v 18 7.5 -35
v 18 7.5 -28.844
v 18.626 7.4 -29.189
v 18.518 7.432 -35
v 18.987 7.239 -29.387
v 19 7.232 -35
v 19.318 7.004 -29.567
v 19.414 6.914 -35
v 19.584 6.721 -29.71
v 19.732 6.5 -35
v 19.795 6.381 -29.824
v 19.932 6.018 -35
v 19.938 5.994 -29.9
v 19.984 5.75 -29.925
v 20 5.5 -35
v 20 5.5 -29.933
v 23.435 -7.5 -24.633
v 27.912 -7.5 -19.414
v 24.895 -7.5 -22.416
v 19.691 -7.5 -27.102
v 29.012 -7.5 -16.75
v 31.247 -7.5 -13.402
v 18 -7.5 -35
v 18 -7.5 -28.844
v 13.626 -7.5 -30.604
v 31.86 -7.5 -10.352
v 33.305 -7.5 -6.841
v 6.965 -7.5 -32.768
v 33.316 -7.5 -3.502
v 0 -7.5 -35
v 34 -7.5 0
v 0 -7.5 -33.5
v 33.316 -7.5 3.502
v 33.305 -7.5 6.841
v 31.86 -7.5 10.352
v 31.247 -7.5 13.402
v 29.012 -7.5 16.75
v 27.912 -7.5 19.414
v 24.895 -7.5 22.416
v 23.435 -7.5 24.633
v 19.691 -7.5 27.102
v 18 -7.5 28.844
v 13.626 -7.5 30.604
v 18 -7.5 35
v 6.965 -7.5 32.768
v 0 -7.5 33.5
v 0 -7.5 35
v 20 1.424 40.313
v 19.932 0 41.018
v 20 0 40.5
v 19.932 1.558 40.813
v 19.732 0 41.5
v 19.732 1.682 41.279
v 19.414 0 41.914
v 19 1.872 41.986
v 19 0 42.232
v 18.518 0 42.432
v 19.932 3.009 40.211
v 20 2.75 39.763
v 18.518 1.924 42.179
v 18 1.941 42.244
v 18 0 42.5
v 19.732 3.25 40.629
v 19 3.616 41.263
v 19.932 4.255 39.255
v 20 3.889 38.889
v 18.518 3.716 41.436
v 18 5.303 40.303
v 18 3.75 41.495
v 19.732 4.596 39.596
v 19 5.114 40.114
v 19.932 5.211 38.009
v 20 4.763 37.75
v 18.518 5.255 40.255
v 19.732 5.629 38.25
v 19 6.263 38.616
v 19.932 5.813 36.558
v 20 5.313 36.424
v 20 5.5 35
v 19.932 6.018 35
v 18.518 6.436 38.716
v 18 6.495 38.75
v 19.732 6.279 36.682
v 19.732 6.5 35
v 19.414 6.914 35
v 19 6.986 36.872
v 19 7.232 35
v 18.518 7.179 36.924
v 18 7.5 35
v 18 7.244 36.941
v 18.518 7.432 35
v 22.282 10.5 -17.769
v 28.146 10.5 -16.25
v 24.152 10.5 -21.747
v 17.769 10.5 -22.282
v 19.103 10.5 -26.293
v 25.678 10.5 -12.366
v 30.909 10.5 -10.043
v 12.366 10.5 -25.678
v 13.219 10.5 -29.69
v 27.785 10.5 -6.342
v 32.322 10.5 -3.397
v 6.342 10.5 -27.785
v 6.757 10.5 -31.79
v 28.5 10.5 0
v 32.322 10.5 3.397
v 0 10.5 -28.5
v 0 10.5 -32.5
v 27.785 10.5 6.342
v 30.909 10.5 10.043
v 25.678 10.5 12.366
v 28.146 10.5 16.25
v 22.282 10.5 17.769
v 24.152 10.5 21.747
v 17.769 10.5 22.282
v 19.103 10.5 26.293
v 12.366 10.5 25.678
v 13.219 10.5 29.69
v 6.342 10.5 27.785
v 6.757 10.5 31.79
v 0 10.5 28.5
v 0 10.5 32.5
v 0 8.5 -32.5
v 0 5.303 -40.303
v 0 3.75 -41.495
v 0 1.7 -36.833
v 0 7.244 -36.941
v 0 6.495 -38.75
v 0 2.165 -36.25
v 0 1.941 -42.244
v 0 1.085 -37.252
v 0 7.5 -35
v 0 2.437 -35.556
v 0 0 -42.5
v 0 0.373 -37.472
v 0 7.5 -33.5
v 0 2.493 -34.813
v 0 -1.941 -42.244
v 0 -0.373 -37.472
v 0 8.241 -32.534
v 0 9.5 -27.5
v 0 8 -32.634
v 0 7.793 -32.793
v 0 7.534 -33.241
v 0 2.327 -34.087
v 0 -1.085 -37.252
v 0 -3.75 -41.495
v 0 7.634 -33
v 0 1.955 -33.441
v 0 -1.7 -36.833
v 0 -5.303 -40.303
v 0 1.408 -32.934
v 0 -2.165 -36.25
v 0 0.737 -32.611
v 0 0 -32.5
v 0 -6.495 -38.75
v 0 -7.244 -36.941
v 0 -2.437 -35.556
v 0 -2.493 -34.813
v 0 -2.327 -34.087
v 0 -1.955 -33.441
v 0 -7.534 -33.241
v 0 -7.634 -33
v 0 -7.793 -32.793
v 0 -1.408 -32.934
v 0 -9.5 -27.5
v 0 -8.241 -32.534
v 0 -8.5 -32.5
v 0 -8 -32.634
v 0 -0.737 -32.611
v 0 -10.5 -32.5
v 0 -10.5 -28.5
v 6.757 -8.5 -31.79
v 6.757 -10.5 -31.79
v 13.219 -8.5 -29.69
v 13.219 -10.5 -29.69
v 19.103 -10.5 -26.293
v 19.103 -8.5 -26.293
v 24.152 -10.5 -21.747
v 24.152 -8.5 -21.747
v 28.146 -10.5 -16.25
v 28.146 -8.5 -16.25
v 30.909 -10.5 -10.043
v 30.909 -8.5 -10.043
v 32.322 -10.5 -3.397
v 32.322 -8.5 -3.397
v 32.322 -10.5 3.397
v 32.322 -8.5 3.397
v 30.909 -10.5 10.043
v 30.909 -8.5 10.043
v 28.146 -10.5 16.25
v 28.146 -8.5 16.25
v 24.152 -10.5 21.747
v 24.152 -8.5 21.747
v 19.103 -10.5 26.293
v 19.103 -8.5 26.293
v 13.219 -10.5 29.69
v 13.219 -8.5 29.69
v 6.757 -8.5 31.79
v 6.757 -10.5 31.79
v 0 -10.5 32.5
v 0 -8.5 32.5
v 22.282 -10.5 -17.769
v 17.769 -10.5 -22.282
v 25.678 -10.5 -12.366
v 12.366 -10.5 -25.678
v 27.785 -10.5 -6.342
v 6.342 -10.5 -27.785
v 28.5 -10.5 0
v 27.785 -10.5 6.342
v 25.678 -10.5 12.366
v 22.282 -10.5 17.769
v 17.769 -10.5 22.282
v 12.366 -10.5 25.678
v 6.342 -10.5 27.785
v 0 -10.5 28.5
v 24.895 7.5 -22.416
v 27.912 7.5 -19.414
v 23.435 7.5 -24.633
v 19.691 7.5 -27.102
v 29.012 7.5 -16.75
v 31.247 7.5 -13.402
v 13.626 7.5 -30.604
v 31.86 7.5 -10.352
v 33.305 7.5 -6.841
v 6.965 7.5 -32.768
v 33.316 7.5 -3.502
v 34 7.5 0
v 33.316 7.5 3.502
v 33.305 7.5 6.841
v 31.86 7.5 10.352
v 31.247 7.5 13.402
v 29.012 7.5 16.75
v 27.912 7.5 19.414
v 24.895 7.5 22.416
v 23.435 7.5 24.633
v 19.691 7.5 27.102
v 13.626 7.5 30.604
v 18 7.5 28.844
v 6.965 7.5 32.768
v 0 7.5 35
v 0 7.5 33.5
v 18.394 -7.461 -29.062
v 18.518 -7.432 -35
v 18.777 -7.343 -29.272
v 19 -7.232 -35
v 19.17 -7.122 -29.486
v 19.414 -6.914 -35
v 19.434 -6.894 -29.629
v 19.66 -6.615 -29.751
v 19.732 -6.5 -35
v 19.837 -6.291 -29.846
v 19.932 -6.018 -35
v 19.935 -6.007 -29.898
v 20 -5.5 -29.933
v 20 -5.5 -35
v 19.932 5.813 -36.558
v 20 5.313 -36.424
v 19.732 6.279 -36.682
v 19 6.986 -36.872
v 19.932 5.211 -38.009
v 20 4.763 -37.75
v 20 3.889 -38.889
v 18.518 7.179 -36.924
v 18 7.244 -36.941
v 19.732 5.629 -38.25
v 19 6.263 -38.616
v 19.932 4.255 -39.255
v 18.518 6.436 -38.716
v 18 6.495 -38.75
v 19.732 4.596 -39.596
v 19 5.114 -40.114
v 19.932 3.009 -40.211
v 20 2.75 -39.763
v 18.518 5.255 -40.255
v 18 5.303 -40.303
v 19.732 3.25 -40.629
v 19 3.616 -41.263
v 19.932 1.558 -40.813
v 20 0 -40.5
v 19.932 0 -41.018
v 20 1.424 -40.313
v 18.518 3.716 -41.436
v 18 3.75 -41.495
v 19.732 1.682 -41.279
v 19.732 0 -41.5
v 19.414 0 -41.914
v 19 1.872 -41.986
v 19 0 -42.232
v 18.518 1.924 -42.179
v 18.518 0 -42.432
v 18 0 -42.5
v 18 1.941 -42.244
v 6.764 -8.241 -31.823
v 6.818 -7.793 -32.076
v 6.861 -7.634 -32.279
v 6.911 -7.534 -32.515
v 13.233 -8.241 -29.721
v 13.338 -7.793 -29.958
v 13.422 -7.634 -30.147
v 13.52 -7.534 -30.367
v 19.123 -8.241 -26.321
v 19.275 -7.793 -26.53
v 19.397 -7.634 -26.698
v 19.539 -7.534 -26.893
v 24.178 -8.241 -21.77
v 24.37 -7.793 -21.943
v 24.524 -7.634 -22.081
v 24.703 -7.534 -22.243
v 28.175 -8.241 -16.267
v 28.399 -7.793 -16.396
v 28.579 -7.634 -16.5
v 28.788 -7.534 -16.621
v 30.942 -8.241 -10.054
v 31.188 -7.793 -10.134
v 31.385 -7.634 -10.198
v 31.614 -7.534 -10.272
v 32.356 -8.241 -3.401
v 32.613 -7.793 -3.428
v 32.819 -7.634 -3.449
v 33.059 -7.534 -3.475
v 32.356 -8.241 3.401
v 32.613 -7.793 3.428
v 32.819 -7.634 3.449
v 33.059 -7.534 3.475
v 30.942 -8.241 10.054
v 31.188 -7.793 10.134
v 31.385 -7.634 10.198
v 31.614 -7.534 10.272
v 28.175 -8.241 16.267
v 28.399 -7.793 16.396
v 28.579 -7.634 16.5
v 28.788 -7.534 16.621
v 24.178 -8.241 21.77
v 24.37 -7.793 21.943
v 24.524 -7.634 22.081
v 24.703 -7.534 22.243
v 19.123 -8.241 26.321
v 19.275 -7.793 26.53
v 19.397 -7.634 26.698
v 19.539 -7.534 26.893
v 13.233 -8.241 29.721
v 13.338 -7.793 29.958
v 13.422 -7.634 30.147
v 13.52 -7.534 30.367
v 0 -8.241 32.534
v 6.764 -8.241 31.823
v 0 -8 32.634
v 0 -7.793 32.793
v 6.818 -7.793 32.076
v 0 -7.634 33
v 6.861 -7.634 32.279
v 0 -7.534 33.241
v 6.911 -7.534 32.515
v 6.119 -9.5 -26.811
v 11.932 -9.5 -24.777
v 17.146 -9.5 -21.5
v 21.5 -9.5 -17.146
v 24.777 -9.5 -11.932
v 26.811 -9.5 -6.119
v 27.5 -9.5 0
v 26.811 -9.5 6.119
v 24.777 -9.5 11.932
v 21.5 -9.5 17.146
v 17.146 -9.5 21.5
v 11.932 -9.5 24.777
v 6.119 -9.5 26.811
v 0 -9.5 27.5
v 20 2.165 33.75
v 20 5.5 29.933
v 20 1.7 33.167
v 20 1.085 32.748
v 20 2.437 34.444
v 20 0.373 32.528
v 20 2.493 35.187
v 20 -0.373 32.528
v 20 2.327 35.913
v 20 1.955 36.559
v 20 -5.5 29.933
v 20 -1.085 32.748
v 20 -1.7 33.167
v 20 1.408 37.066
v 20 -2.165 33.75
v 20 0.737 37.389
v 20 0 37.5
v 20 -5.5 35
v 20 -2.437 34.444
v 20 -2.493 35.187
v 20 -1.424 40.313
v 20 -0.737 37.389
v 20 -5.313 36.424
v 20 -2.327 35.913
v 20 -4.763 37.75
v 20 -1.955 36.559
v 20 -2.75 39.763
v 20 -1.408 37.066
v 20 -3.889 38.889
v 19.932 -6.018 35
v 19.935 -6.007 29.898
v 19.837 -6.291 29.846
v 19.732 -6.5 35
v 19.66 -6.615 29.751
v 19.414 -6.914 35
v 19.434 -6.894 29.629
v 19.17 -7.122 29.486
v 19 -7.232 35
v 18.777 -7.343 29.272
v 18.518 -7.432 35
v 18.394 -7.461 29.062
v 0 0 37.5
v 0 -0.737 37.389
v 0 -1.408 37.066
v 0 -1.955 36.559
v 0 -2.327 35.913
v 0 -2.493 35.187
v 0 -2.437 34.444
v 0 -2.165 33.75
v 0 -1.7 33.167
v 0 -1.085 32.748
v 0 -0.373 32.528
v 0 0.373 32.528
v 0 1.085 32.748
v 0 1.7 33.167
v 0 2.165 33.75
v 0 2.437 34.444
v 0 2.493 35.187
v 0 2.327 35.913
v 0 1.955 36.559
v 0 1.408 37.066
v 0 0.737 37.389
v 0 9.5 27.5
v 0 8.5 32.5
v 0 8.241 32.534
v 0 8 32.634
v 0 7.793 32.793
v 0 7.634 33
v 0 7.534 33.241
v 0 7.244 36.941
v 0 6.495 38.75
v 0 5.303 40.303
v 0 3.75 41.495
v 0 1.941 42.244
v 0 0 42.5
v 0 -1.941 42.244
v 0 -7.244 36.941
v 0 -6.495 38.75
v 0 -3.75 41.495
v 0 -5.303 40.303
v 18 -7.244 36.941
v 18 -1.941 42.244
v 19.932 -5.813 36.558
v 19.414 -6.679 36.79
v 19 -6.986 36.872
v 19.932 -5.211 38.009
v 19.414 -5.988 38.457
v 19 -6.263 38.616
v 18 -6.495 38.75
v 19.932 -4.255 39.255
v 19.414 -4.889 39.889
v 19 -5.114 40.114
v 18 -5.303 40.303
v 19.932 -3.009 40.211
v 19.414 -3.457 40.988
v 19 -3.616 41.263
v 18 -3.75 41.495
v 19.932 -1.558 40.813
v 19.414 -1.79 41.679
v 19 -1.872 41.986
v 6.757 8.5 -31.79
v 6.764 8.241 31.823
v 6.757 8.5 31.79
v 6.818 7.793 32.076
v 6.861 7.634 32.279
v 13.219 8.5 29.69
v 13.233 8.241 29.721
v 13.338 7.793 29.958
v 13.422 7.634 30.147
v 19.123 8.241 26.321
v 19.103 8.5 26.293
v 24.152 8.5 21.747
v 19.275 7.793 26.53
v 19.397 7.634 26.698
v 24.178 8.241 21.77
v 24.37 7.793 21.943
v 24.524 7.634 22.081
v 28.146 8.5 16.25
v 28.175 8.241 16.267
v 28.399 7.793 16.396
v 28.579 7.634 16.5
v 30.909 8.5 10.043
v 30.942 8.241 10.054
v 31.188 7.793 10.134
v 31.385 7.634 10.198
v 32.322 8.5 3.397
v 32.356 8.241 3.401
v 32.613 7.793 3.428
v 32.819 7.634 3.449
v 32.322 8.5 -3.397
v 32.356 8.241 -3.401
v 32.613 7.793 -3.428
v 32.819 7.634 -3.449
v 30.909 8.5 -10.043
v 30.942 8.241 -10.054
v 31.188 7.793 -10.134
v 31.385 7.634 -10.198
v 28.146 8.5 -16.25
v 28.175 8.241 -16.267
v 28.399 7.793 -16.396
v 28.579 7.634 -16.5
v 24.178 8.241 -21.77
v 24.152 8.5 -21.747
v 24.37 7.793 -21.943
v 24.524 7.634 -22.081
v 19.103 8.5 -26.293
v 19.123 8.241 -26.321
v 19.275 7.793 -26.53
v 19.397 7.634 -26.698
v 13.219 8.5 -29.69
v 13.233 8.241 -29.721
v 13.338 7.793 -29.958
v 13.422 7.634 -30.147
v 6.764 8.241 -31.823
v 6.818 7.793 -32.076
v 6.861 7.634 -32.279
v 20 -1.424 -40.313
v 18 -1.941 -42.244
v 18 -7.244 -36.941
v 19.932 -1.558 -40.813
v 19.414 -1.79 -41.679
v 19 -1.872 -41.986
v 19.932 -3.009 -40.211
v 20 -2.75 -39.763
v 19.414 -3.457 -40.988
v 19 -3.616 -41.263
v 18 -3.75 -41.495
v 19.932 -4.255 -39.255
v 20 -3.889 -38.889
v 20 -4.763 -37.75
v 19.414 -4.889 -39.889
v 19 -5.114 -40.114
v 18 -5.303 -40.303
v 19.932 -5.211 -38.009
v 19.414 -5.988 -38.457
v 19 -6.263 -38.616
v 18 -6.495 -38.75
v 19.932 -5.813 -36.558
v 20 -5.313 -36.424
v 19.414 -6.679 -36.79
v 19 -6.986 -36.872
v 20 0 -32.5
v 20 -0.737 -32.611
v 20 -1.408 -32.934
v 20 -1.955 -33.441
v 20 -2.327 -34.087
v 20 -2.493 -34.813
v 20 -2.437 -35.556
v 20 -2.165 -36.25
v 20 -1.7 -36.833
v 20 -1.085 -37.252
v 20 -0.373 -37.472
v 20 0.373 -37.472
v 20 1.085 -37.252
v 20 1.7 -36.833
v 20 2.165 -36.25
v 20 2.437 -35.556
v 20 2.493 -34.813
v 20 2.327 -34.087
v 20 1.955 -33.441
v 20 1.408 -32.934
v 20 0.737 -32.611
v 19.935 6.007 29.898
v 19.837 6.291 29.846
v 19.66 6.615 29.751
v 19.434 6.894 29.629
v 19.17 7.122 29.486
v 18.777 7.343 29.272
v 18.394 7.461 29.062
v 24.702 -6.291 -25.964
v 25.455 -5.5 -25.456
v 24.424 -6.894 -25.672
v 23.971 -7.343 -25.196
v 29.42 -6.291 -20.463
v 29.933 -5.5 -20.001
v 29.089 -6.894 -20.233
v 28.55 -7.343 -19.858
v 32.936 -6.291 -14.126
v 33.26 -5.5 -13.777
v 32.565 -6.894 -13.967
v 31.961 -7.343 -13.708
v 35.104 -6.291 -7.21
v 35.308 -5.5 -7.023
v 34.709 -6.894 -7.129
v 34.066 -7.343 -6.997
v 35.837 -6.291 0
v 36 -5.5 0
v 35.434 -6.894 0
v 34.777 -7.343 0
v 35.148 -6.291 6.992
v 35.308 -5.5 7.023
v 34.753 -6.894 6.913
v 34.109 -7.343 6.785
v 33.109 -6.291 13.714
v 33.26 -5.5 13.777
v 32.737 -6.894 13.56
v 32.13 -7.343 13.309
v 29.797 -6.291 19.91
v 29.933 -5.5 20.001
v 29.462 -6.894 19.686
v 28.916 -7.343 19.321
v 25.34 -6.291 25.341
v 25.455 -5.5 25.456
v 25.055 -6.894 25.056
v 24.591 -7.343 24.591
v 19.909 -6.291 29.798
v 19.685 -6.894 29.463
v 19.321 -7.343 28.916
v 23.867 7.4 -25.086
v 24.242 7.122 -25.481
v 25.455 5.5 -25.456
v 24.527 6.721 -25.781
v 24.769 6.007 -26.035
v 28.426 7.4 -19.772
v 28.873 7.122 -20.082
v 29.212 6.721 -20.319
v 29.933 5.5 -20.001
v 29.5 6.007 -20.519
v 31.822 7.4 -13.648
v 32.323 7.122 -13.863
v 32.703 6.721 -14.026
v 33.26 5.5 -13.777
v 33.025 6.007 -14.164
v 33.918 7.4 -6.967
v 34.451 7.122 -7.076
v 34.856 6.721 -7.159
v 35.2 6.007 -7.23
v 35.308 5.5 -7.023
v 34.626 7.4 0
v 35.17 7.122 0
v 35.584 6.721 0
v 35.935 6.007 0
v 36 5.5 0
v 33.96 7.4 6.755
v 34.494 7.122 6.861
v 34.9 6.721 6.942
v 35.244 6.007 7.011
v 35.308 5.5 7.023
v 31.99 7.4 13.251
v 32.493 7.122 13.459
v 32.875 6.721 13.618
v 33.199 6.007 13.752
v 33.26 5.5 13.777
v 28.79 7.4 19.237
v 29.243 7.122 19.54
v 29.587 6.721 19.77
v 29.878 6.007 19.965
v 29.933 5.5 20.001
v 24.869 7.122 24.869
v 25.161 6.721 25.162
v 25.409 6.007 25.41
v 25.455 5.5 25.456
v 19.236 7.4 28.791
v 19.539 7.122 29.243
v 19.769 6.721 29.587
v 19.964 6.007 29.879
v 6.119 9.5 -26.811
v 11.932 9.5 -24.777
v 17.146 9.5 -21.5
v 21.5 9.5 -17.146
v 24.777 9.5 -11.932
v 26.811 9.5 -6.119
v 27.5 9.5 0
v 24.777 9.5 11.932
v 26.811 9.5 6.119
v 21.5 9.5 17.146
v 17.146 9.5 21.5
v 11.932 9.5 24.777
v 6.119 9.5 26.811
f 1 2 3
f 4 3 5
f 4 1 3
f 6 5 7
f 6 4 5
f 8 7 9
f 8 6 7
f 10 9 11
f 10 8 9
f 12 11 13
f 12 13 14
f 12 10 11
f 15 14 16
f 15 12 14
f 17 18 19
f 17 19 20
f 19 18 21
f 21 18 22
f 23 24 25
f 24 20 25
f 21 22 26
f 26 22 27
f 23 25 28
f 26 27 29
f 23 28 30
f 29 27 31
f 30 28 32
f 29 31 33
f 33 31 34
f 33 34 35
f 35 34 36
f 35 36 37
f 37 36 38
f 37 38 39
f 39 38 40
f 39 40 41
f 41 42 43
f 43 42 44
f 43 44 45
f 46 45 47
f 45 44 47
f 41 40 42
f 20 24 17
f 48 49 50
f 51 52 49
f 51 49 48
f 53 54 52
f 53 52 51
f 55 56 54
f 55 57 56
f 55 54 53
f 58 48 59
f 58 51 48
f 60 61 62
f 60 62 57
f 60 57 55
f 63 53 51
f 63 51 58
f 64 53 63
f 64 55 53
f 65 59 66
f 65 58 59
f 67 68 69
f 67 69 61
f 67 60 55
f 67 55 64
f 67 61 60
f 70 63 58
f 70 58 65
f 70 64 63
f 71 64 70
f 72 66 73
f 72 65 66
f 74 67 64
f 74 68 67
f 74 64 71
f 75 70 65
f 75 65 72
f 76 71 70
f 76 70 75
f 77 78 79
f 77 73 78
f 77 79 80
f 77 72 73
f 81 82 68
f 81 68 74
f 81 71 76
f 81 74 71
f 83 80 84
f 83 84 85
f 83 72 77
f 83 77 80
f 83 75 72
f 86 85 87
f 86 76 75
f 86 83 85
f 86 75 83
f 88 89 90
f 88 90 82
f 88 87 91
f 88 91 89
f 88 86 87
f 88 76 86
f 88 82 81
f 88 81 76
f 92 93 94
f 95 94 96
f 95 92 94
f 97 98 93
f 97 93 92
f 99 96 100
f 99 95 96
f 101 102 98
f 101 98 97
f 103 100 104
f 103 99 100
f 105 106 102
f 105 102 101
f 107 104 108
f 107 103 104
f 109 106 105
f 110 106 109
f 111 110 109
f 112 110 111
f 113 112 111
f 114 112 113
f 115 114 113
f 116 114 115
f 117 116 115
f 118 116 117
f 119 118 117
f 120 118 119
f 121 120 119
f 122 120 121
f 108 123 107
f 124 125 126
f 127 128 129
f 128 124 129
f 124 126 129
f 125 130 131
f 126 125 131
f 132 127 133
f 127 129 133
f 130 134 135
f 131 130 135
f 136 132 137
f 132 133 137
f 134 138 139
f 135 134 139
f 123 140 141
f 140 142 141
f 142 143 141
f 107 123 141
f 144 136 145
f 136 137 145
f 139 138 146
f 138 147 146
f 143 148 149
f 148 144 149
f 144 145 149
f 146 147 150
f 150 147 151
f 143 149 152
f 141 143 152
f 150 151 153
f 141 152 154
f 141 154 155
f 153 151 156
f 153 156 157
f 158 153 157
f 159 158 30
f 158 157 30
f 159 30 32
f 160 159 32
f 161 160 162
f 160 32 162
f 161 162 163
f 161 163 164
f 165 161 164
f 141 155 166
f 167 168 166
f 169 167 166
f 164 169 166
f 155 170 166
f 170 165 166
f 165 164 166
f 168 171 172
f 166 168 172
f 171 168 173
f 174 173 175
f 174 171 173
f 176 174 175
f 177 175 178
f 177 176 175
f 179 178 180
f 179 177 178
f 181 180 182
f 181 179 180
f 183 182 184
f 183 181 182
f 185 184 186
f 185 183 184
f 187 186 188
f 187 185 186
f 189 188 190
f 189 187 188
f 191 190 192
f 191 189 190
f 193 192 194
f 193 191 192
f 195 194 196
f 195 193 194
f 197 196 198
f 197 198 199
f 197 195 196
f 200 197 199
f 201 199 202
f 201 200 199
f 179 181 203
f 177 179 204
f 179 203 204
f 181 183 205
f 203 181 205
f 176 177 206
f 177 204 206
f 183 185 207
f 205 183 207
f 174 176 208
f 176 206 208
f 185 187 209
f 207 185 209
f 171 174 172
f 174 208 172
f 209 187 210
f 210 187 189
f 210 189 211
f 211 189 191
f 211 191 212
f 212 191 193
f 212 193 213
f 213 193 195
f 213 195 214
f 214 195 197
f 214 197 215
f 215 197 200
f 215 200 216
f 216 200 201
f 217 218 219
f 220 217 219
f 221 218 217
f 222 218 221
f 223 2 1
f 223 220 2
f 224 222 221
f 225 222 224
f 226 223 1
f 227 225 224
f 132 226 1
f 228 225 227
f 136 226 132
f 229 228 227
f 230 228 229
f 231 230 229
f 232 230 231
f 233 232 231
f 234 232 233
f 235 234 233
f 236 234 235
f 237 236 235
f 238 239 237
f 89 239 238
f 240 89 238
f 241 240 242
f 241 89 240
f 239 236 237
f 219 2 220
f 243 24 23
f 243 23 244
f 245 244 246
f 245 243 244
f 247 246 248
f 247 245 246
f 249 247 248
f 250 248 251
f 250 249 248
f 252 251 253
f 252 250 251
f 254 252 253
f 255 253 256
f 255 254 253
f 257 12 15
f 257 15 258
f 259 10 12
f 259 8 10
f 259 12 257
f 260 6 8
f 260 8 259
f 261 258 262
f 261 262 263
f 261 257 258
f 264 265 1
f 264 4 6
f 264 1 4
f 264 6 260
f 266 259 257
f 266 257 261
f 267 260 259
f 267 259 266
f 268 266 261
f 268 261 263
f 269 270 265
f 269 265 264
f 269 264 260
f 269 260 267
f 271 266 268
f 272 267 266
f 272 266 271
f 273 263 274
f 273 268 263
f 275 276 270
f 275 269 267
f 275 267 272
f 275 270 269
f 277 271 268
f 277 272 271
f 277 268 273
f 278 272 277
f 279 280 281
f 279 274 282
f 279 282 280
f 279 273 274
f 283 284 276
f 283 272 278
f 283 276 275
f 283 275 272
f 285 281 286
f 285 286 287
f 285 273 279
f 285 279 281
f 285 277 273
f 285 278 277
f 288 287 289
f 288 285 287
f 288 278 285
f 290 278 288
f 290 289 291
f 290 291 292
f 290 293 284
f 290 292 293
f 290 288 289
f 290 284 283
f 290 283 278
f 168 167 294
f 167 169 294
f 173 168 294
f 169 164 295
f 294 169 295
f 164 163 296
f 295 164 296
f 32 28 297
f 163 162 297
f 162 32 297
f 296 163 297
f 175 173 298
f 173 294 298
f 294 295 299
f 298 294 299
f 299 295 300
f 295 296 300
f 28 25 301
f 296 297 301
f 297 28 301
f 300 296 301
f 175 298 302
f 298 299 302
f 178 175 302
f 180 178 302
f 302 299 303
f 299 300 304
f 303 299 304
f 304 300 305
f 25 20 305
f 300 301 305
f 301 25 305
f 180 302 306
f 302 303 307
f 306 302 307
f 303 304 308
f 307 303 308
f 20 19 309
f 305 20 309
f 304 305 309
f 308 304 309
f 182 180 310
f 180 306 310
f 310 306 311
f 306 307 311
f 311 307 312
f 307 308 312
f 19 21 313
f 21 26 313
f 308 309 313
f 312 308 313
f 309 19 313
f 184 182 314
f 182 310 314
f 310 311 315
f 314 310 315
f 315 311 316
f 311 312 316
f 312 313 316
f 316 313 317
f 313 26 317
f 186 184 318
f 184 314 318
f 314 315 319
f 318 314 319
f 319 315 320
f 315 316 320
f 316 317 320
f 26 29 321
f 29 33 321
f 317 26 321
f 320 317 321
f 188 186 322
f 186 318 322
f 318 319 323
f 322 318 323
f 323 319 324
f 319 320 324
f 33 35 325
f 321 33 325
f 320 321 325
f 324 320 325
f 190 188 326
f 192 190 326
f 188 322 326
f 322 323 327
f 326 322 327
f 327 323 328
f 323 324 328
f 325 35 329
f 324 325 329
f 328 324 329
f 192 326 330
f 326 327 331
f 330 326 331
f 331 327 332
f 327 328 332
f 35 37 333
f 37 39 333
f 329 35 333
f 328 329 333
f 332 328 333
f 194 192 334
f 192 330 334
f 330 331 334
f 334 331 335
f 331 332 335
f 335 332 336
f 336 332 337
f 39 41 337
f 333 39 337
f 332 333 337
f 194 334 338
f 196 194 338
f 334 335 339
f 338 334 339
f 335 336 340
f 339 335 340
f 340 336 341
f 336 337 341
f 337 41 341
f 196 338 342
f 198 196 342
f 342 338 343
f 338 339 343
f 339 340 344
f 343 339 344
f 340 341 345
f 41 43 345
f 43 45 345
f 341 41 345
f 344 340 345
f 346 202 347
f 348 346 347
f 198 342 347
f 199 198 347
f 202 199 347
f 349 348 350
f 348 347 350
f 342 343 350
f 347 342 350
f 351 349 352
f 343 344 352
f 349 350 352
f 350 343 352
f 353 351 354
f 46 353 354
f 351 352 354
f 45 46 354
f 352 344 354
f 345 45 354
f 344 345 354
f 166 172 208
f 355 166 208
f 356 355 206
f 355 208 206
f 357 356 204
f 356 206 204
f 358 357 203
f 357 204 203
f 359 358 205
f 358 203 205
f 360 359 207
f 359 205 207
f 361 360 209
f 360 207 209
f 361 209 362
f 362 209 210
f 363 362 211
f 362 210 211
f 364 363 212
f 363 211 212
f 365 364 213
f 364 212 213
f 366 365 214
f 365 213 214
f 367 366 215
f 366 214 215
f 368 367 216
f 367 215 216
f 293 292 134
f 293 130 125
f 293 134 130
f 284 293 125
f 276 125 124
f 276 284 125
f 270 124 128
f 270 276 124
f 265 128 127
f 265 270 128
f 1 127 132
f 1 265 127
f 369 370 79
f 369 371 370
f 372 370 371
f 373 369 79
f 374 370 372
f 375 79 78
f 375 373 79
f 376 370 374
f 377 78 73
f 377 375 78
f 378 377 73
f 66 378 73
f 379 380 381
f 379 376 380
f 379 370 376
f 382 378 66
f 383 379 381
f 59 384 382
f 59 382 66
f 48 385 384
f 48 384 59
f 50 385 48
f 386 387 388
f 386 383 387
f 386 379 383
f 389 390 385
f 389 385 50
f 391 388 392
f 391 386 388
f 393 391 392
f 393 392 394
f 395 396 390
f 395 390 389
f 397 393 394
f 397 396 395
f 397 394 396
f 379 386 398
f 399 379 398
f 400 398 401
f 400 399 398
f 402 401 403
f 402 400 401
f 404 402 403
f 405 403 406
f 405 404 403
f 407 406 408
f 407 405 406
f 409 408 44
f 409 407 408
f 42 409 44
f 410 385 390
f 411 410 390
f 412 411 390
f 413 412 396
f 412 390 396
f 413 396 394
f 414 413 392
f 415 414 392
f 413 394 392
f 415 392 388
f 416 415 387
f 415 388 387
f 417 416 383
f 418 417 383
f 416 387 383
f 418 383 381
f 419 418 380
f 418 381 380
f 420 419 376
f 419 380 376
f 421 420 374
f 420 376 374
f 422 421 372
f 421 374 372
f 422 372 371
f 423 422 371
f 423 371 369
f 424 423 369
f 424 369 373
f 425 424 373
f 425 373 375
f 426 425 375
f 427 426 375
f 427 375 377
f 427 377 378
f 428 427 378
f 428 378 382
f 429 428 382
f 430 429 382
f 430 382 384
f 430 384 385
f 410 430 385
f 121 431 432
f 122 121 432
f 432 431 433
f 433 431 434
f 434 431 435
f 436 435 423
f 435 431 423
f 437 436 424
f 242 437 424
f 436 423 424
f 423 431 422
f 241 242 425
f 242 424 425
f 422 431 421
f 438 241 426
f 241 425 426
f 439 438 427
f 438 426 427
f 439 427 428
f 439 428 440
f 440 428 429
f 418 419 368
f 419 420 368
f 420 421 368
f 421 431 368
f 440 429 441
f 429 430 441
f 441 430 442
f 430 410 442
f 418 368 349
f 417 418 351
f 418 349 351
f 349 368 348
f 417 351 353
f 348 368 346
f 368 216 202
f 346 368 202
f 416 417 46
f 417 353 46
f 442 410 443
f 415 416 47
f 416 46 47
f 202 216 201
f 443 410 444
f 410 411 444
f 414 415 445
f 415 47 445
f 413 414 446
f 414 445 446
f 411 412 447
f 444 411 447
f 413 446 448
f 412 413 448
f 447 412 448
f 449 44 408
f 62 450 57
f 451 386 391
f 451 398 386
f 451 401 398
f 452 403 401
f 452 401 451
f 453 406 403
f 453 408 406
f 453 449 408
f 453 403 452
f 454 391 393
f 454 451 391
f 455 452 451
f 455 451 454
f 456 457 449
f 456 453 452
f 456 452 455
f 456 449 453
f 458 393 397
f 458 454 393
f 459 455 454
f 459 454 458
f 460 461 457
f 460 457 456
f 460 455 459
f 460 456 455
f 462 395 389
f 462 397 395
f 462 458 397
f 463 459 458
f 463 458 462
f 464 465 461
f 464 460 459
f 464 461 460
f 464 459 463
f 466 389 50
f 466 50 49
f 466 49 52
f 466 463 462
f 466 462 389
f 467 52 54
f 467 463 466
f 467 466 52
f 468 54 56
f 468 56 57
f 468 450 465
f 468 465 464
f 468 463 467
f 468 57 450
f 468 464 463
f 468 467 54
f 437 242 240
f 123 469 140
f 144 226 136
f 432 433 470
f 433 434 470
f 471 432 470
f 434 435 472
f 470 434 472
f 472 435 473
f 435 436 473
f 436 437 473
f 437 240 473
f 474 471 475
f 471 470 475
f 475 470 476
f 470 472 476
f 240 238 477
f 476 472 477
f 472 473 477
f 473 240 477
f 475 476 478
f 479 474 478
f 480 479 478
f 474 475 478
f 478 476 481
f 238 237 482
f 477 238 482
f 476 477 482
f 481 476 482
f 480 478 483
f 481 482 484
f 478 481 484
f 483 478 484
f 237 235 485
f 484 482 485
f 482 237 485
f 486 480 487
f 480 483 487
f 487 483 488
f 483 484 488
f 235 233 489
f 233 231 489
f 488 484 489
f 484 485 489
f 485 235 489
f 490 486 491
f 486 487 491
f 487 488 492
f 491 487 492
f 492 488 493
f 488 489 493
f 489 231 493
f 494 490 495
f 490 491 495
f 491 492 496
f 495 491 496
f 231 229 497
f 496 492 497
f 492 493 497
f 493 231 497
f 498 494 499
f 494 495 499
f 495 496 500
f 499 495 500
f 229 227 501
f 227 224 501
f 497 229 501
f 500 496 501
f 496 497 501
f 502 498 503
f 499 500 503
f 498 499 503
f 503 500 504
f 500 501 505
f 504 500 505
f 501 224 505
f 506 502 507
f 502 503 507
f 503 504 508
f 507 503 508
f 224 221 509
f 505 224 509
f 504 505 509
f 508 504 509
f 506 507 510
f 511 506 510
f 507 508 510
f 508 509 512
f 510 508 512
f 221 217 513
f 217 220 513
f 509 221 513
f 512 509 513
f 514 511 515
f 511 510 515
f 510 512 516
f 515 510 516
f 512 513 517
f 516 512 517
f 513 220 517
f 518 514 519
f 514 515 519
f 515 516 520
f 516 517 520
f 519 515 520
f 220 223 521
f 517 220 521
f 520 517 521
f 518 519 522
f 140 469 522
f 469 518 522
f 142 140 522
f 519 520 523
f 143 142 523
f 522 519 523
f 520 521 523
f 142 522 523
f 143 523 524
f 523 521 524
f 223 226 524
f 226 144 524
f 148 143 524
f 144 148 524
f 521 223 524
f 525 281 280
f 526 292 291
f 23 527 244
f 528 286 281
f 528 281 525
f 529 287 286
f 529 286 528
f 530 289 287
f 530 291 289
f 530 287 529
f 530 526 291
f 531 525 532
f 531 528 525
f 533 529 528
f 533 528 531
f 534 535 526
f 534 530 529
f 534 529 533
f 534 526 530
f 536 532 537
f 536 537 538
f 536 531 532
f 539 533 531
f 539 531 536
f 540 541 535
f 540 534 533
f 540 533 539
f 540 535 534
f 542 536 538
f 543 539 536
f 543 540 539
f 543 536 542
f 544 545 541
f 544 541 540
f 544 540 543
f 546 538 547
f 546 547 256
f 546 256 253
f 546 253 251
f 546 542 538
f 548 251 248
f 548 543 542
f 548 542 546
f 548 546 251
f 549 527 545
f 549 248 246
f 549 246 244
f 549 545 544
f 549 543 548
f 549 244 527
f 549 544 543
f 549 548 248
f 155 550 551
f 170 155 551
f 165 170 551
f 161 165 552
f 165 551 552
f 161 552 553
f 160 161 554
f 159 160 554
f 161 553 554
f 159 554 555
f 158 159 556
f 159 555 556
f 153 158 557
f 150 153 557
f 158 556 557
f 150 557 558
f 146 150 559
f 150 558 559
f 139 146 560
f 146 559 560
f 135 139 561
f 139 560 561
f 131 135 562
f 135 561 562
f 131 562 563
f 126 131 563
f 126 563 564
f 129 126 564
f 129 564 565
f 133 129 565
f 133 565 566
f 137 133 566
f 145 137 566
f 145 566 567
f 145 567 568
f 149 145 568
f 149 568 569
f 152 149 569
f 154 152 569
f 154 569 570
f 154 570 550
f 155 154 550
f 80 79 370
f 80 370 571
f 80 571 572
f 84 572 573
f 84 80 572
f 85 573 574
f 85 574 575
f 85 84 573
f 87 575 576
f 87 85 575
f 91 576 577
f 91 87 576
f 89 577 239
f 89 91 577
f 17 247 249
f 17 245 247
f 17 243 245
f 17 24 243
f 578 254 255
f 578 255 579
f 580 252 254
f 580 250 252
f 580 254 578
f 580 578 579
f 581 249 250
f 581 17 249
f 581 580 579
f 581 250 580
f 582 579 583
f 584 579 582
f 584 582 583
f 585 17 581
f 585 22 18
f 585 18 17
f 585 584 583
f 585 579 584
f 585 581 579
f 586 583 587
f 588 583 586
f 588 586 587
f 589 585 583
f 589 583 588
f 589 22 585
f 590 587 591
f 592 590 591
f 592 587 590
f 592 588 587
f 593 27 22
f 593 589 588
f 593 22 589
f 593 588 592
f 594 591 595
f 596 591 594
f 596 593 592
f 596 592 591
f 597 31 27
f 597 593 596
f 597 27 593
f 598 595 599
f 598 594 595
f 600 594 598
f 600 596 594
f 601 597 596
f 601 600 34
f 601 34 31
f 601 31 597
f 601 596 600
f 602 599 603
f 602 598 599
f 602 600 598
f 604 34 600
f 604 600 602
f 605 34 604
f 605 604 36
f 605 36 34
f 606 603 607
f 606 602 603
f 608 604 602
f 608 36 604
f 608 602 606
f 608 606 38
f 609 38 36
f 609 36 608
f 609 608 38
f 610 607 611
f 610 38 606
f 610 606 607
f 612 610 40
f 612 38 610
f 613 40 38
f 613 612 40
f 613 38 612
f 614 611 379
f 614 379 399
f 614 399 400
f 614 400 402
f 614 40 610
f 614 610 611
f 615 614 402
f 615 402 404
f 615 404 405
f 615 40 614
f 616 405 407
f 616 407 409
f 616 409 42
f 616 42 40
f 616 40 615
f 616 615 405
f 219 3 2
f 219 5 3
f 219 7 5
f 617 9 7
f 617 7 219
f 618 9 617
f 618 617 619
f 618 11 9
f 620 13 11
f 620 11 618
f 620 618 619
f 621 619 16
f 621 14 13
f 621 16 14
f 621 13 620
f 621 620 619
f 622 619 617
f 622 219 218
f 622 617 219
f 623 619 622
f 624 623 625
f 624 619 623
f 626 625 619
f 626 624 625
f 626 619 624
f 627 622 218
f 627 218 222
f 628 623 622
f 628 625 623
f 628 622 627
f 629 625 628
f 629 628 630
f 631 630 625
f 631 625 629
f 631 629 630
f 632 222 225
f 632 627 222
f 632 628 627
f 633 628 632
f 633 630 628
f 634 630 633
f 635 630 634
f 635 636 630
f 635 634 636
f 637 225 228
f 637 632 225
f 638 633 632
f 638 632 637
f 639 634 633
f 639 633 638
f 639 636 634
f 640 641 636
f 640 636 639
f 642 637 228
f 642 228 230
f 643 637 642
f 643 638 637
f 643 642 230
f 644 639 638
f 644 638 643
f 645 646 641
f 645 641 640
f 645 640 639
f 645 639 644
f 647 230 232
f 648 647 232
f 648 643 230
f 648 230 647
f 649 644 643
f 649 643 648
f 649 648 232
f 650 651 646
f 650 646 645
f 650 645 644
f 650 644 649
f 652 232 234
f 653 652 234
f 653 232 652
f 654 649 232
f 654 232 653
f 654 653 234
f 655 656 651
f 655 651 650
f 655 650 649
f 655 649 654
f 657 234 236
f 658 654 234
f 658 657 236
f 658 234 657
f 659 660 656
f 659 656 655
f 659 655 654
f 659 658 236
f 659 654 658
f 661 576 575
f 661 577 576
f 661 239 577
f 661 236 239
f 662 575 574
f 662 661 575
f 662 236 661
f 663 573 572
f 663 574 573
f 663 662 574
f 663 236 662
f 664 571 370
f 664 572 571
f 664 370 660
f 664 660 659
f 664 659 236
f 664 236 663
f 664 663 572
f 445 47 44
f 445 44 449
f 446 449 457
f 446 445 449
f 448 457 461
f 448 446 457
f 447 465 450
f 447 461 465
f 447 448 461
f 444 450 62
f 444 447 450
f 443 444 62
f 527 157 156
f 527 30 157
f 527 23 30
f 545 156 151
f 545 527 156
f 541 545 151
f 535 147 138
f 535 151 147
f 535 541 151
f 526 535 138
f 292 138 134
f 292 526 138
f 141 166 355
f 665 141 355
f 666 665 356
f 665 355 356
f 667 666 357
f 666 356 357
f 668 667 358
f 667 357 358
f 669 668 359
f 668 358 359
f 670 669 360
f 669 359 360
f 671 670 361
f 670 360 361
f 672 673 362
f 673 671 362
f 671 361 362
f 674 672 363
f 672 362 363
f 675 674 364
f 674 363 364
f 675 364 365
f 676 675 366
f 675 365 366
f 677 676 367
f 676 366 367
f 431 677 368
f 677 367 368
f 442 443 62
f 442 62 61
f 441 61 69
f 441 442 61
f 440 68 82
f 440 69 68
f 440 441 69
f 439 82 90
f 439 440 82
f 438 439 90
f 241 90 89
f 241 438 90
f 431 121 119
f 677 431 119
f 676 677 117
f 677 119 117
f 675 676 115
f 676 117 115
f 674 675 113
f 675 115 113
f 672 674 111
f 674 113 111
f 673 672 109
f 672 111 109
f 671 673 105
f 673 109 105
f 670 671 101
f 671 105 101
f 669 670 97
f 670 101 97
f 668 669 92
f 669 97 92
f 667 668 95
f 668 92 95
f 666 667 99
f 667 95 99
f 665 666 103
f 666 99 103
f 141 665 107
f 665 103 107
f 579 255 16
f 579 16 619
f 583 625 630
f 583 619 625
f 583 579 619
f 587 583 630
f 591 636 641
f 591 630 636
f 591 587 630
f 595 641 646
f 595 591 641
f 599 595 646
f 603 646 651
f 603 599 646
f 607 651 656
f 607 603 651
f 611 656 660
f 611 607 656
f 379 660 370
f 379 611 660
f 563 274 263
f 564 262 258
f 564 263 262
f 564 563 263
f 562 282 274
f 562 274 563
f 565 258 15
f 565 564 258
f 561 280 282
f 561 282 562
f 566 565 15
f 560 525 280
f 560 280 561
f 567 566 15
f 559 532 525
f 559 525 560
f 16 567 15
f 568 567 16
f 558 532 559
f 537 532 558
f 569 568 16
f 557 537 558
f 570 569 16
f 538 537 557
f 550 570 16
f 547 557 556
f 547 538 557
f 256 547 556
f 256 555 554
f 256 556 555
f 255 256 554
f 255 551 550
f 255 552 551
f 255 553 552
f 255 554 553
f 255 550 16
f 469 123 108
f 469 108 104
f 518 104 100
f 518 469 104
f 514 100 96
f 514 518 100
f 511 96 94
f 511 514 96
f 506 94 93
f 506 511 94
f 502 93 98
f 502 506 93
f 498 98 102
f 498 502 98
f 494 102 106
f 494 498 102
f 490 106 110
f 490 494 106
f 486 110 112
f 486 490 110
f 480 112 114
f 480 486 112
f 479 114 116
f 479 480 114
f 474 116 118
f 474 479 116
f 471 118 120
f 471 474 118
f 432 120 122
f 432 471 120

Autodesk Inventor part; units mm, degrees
ref_plane "YZ Plane" through (0, 0, 0) normal (1, 0, 0) x (0, 1, 0)
ref_plane "XZ Plane" through (0, 0, 0) normal (0, 1, 0) x (-1, 0, 0)
ref_plane "XY Plane" through (0, 0, 0) normal (0, 0, 1) x (1, 0, 0)
sketch "Sketch1" plane through (0, 0, 0) normal (0, 1, 0) x (-1, 0, 0)
  arc A0 (0, 27.5) -> (0, -27.5) centre (0, 0) ccw
  arc A1 (0, 32.5) -> (0, -32.5) centre (0, 0) ccw
  line L0 (0, -32.5) -> (0, -42.5)
  line L1 (0, -42.5) -> (-20, -42.5)
  line L2 (-20, -42.5) -> (-20, -25.6174)
  line L3 (-20, 25.6174) -> (-20, 42.5)
  line L4 (-20, 42.5) -> (0, 42.5)
  line L5 (0, 42.5) -> (0, 32.5)
  line L6 (0, -32.5) -> (0, -27.5)
  line L7 (0, 27.5) -> (0, 32.5)
  arc A2 (-20, 29.9333) -> (-20, -29.9333) centre (0, 0) ccw
  dimension "d0" = 27.5
  dimension "d1" = 32.5
  dimension "d2" = 10
  dimension "d3" = 20
  dimension "d4" = 36
extrude "Extrusion1" add sketch "Sketch1" along normal mid plane 21 contours A0 L6 A1 L7
extrude "Extrusion2" add sketch "Sketch1" along normal mid plane 15 contours A1 L3 L4 L5 | L0 L1 L2 A1 | A1 L2 A2 L3
sketch "Sketch2" plane through (0, -10.5, -27.5) normal (-1, 0, 0) x (0, 0, 1)
  line L0 (0, 21) -> (0, 0) projected
  line L1 (55, 0) -> (55, 21) projected
  point P0 (27.5, 10.5)
  point P1 (-7.5, 10.5)
  point P2 (62.5, 10.5)
  dimension "d9" = 7.5
  dimension "d10" = 7.5
hole "Hole1" at (0, 0, -35) at (0, 0, 35) direction (1, 0, 0) diameter 5 end through all
full round fillet "Full Round Fillet1" first side at (9.2593, 7.5, 38.8519) centre faces at (13.3333, -2.5, -42.5) second side at (9.2593, -7.5, 38.8519)
full round fillet "Full Round Fillet2" first side at (9.2593, -7.5, 38.8519) centre faces at (6.6667, -2.5, 42.5) second side at (9.2593, 7.5, 38.8519)
fillet "Fillet1" radius 2 10 edges at (36, -7.5, 0) (20, 5.3033, 40.3033) (20, -5.3033, 40.3033) (20, 7.5, 32.4667) (20, -7.5, 32.4667) (36, 7.5, 0) (20, -7.5, -32.4667) (20, 7.5, -32.4667) (20, 5.3033, -40.3033) (20, -5.3033, -40.3033)
chamfer "Chamfer1" distance 1 angle 45 2 edges at (27.5, -10.5, 0) (27.5, 10.5, 0)
fillet "Fillet2" radius 1 2 edges at (32.5, 7.5, 0) (32.5, -7.5, 0)
properties part number "Pokrywa stopy korbowodu"
